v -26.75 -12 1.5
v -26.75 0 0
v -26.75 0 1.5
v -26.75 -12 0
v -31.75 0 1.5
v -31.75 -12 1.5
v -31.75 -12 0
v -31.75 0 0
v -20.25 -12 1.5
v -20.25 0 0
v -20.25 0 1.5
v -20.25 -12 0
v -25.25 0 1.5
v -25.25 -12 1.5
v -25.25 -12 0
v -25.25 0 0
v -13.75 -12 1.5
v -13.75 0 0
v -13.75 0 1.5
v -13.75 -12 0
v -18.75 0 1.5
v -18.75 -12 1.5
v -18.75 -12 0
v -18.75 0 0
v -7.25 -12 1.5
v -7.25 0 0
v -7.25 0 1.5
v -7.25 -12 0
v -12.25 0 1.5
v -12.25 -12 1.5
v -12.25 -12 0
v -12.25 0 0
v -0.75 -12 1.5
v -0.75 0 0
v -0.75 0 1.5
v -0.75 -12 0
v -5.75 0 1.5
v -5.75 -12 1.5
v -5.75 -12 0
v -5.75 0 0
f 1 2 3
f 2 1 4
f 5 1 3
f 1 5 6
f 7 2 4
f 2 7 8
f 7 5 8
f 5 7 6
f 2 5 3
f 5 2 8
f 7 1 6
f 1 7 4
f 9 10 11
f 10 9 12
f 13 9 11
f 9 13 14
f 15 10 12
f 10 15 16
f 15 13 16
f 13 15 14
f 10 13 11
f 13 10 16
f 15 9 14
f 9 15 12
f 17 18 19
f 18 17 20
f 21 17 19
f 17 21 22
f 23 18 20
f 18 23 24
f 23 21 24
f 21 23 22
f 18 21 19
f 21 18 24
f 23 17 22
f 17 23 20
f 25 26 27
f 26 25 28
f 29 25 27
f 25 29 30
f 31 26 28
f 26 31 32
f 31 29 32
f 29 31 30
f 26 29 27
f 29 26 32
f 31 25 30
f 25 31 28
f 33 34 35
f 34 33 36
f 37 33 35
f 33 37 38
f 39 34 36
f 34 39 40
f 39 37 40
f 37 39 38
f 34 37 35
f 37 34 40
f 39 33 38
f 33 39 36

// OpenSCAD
// 10-well agarose gel comb, printed lying flat
// Units: mm

// ---------- Parameters ----------
plate_t      = 1.5;     // plate thickness (Z)
spine_len    = 70;      // spine length (X)
spine_wid    = 12;      // spine width (Y)
tooth_count  = 10;      // number of teeth
tooth_w      = 5.0;     // tooth width (X)
tooth_l      = 12;      // tooth length (Y)
tooth_gap    = 1.5;     // gap between teeth (X)
eps          = 0.5;     // cutter overshoot past faces

$fn = 64;

// ---------- Derived ----------
row_start = -(tooth_count * tooth_w + (tooth_count - 1) * tooth_gap) / 2; // first tooth X
pitch     = tooth_w + tooth_gap;                                          // centre-to-centre spacing

// ---------- Model ----------
difference() {
    // Base plate: spine + teeth
    translate([row_start, -tooth_l, 0])
        for (i = [0 : tooth_count - 1])
            translate([i * pitch, 0, 0])
                cube([tooth_w, tooth_l, plate_t]);

    translate([0, -tooth_l - eps, 0])
        cube([spine_len, tooth_l + 2 * eps, plate_t]); // spine under the teeth

    // Cut out the wells (through the plate)
    translate([row_start, 0, -eps])
        for (i = [0 : tooth_count - 1])
            translate([i * pitch, 0, 0])
                cube([tooth_w, tooth_l, plate_t + 2 * eps]);
}
